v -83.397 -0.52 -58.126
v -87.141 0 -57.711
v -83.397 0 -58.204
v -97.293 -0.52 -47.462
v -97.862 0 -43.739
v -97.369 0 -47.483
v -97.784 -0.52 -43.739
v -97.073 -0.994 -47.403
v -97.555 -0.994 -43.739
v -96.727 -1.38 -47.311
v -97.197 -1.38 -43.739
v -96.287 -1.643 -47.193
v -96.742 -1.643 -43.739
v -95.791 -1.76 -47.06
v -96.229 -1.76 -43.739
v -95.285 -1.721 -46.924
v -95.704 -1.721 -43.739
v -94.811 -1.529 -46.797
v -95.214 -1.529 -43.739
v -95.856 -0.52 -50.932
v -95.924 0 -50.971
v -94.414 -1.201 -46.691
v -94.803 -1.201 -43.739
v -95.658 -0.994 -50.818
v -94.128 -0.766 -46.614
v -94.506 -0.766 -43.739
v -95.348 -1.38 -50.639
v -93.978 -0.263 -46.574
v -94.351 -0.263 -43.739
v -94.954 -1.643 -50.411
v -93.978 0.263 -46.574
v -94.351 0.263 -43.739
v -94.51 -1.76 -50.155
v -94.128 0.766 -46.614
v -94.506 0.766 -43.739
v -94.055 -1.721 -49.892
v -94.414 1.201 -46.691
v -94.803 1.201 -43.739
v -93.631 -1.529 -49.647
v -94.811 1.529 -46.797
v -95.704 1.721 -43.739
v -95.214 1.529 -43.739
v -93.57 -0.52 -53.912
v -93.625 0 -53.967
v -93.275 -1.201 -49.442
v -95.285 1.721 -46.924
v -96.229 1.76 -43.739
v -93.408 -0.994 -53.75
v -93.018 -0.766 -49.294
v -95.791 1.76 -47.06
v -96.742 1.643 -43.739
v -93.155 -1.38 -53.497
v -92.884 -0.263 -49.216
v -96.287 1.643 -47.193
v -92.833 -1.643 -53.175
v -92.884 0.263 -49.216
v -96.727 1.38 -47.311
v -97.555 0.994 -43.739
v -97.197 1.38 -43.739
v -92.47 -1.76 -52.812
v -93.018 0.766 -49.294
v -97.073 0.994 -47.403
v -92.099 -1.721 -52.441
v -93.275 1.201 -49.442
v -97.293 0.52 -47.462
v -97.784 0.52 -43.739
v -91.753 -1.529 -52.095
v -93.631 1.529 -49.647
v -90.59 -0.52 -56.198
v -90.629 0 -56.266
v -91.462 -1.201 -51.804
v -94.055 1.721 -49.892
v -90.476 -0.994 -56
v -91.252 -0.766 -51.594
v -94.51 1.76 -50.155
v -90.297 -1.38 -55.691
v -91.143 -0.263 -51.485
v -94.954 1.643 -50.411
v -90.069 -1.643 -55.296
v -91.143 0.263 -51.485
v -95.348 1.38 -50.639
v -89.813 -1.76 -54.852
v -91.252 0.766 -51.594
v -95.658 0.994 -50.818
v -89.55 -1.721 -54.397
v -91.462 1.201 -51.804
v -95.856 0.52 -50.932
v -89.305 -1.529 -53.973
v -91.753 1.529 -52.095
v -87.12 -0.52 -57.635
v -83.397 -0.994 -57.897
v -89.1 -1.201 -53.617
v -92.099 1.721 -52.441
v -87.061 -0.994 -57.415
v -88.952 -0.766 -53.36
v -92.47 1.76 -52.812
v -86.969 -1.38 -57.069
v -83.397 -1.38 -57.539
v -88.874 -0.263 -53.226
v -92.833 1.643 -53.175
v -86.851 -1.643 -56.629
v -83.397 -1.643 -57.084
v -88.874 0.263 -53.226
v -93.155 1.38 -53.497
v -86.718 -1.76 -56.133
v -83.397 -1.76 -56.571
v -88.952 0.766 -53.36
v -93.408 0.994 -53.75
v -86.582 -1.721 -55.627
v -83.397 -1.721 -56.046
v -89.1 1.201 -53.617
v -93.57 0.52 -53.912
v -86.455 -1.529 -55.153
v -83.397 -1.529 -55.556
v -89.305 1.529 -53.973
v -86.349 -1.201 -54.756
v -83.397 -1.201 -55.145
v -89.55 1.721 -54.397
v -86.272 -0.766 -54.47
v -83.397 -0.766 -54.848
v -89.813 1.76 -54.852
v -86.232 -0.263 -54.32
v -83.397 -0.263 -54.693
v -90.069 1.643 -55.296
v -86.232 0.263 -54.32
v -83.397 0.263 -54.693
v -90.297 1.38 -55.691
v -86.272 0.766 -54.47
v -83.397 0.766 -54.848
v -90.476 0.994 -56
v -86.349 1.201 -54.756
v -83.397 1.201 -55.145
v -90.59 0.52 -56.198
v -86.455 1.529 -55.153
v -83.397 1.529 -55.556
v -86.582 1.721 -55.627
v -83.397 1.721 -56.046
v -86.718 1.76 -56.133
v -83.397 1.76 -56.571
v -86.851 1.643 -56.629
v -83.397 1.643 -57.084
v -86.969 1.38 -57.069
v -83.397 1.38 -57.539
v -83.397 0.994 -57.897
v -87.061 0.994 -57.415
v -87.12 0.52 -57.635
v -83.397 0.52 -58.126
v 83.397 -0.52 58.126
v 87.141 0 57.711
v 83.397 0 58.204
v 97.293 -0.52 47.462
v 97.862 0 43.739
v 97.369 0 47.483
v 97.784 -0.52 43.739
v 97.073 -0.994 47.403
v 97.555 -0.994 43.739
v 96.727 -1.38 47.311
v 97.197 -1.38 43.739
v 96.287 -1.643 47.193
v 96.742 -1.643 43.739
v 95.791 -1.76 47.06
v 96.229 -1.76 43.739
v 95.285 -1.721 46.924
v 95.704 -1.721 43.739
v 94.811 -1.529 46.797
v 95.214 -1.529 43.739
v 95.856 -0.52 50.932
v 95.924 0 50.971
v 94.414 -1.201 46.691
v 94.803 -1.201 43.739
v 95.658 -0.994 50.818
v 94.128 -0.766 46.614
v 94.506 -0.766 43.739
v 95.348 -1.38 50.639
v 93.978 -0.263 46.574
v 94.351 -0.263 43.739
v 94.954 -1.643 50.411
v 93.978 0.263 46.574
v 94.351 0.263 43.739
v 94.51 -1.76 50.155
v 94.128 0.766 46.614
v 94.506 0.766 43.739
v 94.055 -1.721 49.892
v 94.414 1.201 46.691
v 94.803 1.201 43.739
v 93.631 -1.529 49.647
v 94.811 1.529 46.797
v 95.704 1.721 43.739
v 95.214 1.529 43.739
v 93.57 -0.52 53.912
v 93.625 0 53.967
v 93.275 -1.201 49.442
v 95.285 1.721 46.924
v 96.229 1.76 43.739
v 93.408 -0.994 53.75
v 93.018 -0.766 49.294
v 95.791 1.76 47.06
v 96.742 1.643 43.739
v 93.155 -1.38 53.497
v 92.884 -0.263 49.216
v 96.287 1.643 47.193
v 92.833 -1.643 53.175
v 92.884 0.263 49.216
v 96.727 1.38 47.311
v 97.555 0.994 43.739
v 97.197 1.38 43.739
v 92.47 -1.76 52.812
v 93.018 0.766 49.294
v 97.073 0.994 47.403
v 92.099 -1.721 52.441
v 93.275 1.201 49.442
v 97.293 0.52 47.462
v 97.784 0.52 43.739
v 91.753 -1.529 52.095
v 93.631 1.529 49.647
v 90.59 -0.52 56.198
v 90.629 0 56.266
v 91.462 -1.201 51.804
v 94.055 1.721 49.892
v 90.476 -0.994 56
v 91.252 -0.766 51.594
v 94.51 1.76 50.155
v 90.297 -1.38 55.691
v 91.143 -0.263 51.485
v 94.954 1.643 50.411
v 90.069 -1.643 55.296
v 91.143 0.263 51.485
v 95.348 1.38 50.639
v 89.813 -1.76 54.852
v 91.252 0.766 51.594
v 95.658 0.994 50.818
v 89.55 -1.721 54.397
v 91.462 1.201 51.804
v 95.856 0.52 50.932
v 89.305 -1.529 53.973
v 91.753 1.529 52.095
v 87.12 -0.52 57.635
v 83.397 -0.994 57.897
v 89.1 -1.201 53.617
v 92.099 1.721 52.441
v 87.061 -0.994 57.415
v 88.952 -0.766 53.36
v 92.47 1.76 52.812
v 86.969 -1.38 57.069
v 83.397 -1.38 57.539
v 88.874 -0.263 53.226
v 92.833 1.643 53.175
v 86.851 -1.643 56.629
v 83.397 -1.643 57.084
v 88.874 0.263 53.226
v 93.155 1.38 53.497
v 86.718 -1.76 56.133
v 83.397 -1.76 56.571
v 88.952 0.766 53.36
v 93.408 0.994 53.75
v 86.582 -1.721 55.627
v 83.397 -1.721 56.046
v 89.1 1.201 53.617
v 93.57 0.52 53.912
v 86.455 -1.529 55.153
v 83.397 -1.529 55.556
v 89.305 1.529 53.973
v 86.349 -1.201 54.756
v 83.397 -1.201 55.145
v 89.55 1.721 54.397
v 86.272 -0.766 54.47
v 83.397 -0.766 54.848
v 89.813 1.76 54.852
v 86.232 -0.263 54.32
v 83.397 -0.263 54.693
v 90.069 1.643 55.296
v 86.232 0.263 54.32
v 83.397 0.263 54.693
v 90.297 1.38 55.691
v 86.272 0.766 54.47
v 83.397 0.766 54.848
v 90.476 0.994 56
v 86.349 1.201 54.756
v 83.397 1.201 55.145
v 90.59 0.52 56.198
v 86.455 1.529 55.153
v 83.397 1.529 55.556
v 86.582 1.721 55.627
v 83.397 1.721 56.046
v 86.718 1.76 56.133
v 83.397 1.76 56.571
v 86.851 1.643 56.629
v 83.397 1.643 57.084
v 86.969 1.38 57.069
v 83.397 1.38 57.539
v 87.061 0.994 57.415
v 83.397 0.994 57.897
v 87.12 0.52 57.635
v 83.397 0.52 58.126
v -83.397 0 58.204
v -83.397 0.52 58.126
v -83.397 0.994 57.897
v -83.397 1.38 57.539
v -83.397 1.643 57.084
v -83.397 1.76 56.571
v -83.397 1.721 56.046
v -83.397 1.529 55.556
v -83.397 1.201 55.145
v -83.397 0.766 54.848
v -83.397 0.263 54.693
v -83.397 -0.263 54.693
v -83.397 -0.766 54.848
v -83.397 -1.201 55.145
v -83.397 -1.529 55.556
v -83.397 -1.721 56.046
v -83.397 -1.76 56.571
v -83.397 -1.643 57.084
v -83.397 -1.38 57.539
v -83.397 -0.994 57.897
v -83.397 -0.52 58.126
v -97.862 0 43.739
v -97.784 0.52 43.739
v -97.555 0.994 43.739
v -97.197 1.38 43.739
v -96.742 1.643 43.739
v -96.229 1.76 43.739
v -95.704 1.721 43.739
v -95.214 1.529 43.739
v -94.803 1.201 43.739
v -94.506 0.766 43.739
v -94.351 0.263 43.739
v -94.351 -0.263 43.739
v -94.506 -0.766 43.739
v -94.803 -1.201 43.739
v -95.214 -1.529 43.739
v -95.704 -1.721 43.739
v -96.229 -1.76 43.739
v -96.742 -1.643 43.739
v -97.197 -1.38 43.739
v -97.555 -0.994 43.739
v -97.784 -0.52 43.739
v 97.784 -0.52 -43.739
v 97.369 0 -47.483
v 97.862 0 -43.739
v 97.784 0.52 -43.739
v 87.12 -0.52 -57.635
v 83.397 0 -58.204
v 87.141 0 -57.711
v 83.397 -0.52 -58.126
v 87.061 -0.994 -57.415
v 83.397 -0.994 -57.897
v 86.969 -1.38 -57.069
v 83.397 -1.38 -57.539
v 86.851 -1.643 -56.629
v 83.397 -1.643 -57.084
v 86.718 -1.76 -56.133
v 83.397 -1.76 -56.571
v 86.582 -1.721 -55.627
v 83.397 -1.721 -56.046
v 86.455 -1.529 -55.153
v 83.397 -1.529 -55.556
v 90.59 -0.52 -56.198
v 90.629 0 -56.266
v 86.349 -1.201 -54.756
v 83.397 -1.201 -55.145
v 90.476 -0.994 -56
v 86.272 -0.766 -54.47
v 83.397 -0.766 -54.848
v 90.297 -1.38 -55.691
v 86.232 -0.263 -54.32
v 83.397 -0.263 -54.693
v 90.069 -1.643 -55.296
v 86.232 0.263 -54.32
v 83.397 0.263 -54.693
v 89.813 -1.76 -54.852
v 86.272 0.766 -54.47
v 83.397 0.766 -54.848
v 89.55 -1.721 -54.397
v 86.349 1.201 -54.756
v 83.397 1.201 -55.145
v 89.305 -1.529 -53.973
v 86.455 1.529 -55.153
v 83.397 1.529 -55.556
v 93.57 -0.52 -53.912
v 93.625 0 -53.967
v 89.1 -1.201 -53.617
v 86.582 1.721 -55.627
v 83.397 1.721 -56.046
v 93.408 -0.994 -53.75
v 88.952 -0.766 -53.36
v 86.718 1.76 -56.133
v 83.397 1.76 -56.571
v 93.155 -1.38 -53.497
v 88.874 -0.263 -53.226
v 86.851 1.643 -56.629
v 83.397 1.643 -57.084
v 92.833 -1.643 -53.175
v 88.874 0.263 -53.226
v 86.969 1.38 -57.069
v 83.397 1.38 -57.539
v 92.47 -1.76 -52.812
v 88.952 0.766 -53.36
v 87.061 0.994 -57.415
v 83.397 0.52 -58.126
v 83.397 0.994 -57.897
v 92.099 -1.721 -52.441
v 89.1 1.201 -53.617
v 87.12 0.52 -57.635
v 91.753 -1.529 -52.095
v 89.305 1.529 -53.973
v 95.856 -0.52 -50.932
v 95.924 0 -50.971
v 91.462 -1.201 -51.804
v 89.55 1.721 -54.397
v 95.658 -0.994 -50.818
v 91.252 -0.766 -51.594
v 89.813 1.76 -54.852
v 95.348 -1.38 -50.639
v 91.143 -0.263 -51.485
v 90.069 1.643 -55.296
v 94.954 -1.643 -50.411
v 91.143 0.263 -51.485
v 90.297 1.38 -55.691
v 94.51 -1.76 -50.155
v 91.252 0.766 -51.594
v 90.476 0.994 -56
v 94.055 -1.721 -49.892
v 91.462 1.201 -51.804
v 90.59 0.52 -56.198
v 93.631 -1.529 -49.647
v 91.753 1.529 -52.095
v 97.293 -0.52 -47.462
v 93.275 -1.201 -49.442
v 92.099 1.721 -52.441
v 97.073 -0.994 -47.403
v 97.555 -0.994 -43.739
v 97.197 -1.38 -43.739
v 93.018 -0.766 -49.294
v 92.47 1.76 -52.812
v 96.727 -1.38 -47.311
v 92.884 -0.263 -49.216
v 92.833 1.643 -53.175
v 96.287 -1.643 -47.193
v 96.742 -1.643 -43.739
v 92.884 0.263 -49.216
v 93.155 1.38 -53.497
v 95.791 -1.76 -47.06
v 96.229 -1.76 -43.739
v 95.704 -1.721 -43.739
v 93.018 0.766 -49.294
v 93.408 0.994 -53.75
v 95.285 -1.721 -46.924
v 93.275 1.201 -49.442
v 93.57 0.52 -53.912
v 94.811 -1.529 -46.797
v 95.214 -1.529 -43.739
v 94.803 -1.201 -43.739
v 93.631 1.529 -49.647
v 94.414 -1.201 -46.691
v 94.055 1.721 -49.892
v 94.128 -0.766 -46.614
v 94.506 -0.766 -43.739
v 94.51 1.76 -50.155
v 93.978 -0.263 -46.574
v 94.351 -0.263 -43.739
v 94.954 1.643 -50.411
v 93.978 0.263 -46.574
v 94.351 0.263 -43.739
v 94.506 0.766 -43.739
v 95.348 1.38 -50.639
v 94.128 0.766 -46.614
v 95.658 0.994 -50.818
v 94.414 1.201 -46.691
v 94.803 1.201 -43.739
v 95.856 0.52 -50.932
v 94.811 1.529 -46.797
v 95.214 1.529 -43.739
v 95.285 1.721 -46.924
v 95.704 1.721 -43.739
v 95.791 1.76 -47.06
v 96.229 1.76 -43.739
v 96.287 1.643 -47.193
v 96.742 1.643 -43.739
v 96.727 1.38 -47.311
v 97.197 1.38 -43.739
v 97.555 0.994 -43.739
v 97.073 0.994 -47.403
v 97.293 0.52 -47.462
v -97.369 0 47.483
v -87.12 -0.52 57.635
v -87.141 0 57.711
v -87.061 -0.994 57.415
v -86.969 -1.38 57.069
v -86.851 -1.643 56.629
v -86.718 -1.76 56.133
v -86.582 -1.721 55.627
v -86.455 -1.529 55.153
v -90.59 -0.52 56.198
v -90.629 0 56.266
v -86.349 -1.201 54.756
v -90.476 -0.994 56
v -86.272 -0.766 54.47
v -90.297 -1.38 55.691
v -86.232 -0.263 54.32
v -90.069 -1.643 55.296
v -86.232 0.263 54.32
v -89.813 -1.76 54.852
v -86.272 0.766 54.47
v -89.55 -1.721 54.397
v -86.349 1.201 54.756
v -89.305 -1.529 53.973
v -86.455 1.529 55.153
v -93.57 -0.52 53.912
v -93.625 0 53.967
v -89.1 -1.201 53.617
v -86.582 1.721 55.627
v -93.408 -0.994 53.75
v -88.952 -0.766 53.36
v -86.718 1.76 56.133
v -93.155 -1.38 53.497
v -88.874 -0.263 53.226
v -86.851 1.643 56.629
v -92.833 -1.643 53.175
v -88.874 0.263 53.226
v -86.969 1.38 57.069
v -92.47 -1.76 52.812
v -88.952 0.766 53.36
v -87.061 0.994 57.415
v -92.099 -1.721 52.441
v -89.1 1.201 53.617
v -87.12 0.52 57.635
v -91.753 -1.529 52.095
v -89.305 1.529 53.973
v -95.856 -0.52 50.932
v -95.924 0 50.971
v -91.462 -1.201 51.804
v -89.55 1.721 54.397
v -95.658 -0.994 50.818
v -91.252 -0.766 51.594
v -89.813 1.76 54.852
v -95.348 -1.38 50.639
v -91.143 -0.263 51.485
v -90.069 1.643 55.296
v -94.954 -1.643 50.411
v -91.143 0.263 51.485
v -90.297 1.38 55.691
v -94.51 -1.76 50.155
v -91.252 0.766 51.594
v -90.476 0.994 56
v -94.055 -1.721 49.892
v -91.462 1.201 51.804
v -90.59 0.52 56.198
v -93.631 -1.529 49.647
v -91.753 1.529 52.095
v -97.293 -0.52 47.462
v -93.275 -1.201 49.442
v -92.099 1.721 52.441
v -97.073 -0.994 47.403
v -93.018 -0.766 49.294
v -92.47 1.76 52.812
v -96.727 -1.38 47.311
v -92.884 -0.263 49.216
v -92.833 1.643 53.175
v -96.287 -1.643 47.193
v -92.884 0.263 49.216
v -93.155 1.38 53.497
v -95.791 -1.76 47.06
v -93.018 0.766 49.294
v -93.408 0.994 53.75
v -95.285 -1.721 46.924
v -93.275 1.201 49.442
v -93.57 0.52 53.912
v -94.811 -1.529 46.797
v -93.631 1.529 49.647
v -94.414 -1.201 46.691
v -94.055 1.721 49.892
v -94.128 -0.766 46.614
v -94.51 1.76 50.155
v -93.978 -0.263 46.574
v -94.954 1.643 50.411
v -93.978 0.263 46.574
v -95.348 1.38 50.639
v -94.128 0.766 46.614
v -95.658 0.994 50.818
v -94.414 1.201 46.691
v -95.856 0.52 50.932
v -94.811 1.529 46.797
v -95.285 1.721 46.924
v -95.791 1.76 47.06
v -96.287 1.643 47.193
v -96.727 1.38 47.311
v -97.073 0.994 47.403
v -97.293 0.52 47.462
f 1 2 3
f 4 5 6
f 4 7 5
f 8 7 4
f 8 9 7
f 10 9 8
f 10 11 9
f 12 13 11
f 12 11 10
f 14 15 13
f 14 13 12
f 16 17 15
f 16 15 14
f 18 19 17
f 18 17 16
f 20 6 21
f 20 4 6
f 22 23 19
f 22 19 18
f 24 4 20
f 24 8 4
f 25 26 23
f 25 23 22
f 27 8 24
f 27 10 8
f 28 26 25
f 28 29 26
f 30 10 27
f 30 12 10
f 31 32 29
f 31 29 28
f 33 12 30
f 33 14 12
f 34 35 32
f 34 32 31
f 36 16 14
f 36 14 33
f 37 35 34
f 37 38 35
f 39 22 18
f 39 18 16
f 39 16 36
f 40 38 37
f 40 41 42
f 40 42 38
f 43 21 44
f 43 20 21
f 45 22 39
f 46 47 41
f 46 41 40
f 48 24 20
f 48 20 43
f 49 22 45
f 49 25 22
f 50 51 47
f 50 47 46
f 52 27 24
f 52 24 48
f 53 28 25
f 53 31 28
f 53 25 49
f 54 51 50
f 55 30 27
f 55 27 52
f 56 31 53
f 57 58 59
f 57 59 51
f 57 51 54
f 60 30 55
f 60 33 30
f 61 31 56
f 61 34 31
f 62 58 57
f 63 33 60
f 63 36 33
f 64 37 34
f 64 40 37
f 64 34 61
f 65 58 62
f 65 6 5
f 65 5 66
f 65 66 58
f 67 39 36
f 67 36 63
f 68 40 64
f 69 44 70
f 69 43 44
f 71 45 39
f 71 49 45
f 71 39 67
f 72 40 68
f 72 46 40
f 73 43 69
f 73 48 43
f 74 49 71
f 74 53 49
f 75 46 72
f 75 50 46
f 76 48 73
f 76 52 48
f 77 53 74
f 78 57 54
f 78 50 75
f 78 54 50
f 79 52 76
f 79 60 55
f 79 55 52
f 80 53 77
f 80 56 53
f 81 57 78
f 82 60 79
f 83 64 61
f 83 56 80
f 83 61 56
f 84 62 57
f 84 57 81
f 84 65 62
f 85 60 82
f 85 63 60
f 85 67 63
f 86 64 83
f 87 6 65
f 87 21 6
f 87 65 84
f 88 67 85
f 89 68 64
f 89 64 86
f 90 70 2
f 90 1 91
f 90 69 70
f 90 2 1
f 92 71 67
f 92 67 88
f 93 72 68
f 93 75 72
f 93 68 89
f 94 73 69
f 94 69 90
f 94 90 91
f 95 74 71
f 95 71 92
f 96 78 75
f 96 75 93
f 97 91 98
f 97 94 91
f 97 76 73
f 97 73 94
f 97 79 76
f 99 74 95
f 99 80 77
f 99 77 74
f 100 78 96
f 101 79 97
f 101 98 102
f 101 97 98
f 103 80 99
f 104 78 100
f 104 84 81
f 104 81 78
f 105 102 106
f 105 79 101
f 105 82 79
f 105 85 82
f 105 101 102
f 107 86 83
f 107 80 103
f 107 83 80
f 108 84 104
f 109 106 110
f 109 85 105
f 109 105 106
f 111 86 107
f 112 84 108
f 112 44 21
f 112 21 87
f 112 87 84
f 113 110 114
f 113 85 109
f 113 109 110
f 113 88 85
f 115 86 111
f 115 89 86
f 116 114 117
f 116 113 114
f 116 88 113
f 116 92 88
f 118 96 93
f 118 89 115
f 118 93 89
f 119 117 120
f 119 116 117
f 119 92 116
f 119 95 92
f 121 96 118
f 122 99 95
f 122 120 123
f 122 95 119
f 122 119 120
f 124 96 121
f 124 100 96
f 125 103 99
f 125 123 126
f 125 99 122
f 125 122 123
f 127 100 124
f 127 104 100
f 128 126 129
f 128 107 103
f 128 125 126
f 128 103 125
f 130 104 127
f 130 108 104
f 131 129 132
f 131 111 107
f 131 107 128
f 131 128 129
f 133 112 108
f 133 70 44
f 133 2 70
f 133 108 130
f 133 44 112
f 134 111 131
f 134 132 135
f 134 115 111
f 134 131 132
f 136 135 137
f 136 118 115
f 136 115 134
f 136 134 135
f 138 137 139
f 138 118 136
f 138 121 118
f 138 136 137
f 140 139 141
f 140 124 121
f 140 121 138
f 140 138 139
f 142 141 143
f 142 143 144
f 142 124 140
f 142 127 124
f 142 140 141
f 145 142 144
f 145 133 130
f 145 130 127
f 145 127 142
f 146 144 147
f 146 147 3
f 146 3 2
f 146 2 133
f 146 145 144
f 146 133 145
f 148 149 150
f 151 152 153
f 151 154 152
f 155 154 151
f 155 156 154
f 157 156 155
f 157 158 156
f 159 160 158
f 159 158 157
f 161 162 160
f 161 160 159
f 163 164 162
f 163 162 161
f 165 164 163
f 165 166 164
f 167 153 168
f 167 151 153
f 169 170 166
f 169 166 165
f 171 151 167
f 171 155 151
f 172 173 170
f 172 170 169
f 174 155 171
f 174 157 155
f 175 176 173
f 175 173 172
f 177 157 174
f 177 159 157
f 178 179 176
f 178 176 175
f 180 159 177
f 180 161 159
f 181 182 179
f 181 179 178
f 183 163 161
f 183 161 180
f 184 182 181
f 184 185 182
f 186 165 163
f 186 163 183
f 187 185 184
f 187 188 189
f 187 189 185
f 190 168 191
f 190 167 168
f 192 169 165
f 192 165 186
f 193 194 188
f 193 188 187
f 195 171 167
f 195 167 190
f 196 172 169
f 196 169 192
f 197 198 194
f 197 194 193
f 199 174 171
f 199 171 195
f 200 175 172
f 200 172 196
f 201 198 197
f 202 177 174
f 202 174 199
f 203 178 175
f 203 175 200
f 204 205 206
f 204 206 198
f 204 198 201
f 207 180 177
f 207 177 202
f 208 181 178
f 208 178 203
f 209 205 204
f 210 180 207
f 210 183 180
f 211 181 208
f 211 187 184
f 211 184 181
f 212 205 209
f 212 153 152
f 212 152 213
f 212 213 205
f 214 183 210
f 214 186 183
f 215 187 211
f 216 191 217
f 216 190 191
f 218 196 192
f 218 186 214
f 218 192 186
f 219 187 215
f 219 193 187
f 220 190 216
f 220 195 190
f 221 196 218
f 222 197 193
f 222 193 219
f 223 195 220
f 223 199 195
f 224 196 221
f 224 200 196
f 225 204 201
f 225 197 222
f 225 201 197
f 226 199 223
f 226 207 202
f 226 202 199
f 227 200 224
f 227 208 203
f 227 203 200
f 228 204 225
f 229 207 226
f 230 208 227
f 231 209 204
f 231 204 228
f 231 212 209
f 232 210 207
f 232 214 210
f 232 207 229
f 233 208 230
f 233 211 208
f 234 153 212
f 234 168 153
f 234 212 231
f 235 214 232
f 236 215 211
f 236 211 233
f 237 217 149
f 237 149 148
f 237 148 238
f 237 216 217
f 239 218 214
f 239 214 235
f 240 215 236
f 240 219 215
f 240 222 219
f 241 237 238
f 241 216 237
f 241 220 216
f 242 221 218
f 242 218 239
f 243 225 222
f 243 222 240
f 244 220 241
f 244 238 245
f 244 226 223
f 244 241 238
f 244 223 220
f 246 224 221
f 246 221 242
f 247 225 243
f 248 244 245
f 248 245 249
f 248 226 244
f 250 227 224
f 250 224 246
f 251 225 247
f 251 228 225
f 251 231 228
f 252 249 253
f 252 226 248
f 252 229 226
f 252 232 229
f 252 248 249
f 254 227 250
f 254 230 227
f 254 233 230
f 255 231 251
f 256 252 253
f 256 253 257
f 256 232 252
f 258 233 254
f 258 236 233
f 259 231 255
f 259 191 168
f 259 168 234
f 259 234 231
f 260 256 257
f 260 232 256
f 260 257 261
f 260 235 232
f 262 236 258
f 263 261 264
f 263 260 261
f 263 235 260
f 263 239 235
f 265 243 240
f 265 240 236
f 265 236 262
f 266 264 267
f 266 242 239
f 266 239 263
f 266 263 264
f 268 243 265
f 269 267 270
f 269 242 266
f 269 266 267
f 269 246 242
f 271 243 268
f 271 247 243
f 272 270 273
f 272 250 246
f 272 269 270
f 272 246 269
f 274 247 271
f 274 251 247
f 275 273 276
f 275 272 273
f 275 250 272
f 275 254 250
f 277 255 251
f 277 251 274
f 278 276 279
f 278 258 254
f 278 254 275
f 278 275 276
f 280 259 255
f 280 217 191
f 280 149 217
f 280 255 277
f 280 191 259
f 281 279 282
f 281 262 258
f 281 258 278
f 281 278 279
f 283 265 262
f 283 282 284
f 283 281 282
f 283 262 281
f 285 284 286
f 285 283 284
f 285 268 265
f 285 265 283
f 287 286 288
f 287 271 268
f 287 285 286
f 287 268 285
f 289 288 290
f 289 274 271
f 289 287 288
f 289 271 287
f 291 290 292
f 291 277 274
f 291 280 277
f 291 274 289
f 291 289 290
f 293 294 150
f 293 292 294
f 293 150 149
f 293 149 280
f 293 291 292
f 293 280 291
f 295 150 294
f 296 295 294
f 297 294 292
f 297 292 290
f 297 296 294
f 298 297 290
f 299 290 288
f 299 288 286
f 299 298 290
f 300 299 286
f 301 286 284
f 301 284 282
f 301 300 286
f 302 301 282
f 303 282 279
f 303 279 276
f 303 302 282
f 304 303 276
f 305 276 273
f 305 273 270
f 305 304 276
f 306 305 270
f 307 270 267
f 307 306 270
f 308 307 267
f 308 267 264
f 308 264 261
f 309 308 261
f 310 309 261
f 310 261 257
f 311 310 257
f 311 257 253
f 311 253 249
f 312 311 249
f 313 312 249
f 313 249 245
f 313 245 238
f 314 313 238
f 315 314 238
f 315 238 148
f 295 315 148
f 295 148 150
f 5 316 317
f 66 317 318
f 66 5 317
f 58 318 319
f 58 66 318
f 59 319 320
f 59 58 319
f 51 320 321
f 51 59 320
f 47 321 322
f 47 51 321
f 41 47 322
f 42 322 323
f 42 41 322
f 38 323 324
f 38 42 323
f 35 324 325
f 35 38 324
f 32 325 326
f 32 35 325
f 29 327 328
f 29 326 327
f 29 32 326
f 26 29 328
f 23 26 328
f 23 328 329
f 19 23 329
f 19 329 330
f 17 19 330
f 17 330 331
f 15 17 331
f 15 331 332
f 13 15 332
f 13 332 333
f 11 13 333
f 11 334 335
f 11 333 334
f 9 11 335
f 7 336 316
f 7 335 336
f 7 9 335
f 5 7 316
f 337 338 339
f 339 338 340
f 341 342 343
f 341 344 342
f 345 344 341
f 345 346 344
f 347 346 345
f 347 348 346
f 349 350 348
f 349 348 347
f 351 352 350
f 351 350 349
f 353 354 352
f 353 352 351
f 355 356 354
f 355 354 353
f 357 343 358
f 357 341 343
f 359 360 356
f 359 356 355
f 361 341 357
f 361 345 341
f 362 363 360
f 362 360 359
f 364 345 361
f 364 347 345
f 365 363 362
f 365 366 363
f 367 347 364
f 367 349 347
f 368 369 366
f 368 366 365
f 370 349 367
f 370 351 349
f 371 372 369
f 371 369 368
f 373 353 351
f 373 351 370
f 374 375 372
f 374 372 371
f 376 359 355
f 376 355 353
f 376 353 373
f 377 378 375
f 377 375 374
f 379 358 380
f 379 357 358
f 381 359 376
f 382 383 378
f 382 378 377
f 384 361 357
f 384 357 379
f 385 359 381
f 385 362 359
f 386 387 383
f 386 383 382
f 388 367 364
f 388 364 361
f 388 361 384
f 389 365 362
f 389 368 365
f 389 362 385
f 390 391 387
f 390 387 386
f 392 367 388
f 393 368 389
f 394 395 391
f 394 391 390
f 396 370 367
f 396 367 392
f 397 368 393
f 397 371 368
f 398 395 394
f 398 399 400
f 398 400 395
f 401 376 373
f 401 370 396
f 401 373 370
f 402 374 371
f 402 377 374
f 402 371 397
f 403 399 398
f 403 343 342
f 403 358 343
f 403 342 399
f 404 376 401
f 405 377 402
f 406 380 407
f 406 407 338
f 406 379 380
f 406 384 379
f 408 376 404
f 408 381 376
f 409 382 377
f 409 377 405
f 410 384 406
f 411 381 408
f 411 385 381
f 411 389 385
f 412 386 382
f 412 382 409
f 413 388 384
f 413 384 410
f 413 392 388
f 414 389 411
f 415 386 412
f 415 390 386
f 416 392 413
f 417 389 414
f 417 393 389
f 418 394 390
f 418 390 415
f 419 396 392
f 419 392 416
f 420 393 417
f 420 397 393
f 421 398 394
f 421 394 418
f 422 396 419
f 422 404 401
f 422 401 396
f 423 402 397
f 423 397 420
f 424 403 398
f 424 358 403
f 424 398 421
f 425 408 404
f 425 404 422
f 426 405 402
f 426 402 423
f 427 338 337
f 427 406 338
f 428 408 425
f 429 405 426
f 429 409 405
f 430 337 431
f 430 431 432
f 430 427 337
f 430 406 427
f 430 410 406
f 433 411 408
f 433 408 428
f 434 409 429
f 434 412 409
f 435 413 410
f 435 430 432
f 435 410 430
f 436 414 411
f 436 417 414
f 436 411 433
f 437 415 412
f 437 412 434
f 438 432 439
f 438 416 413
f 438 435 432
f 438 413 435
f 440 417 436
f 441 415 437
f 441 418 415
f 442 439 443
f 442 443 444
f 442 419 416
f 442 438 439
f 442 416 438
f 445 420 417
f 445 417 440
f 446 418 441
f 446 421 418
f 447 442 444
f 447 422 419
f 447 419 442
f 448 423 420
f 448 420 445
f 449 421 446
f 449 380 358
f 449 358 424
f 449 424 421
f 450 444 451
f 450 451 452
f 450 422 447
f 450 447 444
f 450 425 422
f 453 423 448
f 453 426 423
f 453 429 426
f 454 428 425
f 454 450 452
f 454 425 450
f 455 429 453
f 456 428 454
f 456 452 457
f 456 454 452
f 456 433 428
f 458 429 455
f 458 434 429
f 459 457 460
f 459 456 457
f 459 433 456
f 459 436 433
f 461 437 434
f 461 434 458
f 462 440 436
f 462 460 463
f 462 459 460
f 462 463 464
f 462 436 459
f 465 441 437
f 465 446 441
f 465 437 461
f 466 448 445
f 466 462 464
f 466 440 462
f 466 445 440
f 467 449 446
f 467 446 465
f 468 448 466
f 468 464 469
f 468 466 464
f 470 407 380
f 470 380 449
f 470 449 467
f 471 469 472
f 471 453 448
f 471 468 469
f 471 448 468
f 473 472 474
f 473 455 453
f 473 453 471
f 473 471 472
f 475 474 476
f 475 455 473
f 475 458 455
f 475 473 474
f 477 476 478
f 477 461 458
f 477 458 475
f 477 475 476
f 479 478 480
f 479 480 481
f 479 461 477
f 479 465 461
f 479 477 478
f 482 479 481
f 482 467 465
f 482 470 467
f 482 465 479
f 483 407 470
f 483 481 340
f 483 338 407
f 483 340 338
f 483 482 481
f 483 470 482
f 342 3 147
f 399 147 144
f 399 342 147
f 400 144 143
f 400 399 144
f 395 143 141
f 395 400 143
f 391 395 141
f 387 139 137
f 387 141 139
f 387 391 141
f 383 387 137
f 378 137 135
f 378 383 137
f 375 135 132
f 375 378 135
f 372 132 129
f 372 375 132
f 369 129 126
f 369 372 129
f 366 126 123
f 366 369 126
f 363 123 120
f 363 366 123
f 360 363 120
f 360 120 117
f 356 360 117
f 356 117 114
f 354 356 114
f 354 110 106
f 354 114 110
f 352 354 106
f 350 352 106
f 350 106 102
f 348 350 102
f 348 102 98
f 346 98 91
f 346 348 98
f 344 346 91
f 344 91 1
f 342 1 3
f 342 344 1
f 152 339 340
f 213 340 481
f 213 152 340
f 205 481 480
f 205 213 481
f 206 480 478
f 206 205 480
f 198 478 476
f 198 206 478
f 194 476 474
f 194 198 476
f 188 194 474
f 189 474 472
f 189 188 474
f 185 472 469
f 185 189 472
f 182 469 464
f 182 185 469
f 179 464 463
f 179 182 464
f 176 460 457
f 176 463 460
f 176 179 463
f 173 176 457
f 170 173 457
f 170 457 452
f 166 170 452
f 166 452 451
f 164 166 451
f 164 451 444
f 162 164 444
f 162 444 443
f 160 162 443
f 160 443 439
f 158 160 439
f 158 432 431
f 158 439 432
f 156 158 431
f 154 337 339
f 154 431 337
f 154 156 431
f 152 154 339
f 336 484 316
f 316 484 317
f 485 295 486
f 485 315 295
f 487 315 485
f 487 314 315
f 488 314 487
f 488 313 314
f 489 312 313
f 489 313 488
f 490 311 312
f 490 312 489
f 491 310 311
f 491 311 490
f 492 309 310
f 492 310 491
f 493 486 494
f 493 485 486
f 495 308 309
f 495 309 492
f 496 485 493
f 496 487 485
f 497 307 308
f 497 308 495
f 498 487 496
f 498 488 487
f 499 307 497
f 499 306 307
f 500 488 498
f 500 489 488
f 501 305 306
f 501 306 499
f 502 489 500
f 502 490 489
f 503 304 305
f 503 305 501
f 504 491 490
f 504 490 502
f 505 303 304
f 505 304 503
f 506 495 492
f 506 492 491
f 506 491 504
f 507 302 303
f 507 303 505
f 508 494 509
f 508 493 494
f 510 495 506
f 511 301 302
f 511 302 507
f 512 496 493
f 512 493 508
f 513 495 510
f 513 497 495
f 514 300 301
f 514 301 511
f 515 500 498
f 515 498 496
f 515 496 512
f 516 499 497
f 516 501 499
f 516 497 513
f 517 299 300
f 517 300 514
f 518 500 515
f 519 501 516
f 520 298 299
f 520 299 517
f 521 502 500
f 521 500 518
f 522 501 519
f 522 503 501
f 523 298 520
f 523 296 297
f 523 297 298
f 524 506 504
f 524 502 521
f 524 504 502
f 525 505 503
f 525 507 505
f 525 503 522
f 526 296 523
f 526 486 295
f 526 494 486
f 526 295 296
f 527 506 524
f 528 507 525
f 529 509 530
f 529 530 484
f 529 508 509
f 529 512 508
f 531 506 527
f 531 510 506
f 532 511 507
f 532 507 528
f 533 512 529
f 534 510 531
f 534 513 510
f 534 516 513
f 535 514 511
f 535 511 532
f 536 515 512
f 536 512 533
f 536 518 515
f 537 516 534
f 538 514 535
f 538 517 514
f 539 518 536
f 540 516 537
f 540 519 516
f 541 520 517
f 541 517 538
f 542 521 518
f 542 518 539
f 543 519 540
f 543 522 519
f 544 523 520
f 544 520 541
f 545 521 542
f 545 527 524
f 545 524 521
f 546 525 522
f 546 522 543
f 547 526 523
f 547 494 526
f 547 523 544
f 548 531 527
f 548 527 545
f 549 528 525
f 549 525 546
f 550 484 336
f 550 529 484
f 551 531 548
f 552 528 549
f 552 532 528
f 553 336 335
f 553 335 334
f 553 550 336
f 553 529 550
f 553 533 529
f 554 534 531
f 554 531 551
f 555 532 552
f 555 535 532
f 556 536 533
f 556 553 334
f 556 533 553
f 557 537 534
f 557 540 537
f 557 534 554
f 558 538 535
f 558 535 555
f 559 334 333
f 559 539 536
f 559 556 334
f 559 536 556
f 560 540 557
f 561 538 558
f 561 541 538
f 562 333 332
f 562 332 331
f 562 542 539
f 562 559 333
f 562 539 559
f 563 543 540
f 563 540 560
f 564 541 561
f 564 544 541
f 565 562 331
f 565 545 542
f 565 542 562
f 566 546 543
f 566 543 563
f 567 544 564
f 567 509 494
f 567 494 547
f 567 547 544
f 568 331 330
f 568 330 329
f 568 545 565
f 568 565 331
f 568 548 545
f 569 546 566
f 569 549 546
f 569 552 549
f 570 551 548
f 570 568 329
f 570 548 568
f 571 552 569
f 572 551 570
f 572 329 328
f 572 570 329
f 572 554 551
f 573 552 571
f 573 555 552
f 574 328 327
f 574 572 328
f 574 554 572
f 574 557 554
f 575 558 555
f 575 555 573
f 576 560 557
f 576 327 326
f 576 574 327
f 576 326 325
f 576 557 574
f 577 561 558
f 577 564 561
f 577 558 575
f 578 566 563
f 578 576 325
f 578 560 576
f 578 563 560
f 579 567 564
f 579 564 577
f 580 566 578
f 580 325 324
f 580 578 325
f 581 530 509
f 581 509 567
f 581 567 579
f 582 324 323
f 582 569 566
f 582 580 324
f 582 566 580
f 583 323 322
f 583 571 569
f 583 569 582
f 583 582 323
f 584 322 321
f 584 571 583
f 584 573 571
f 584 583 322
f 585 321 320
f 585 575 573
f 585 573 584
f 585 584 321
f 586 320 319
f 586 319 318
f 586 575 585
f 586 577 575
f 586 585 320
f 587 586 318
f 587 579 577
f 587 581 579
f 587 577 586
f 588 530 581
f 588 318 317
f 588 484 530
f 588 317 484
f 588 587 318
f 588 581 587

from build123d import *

# Parameters (mm, degrees)
O_RINGPROFILE_R = 1.7653


with BuildPart() as part:
    # Sweep2: sweep along a path in O-RingPath
    with BuildLine(Plane(origin=(0, 0, 0), x_dir=(1, 0, 0), z_dir=(0, 1, 0))) as sweep2_path:
        Line((83.396775144, -56.4388), (-83.396775144, -56.4388))
        ThreePointArc((-83.396775144, -56.4388), (-92.377031265, -52.719056121), (-96.096775144, -43.7388))
        Line((-96.096775144, -43.7388), (-96.096775144, 43.7388))
        ThreePointArc((-96.096775144, 43.7388), (-92.377031265, 52.719056121), (-83.396775144, 56.4388))
        Line((-83.396775144, 56.4388), (83.396775144, 56.4388))
        ThreePointArc((83.396775144, 56.4388), (92.377031265, 52.719056121), (96.096775144, 43.7388))
        Line((96.096775144, 43.7388), (96.096775144, -43.7388))
        ThreePointArc((96.096775144, -43.7388), (92.377031265, -52.719056121), (83.396775144, -56.4388))
    # O-RingProfile → Sweep2 (sweep)
    with BuildSketch(Plane.XY):
        with Locations((96.096775144, 0)):
            Circle(O_RINGPROFILE_R)
    sweep(path=sweep2_path.line)


solid = part.part
